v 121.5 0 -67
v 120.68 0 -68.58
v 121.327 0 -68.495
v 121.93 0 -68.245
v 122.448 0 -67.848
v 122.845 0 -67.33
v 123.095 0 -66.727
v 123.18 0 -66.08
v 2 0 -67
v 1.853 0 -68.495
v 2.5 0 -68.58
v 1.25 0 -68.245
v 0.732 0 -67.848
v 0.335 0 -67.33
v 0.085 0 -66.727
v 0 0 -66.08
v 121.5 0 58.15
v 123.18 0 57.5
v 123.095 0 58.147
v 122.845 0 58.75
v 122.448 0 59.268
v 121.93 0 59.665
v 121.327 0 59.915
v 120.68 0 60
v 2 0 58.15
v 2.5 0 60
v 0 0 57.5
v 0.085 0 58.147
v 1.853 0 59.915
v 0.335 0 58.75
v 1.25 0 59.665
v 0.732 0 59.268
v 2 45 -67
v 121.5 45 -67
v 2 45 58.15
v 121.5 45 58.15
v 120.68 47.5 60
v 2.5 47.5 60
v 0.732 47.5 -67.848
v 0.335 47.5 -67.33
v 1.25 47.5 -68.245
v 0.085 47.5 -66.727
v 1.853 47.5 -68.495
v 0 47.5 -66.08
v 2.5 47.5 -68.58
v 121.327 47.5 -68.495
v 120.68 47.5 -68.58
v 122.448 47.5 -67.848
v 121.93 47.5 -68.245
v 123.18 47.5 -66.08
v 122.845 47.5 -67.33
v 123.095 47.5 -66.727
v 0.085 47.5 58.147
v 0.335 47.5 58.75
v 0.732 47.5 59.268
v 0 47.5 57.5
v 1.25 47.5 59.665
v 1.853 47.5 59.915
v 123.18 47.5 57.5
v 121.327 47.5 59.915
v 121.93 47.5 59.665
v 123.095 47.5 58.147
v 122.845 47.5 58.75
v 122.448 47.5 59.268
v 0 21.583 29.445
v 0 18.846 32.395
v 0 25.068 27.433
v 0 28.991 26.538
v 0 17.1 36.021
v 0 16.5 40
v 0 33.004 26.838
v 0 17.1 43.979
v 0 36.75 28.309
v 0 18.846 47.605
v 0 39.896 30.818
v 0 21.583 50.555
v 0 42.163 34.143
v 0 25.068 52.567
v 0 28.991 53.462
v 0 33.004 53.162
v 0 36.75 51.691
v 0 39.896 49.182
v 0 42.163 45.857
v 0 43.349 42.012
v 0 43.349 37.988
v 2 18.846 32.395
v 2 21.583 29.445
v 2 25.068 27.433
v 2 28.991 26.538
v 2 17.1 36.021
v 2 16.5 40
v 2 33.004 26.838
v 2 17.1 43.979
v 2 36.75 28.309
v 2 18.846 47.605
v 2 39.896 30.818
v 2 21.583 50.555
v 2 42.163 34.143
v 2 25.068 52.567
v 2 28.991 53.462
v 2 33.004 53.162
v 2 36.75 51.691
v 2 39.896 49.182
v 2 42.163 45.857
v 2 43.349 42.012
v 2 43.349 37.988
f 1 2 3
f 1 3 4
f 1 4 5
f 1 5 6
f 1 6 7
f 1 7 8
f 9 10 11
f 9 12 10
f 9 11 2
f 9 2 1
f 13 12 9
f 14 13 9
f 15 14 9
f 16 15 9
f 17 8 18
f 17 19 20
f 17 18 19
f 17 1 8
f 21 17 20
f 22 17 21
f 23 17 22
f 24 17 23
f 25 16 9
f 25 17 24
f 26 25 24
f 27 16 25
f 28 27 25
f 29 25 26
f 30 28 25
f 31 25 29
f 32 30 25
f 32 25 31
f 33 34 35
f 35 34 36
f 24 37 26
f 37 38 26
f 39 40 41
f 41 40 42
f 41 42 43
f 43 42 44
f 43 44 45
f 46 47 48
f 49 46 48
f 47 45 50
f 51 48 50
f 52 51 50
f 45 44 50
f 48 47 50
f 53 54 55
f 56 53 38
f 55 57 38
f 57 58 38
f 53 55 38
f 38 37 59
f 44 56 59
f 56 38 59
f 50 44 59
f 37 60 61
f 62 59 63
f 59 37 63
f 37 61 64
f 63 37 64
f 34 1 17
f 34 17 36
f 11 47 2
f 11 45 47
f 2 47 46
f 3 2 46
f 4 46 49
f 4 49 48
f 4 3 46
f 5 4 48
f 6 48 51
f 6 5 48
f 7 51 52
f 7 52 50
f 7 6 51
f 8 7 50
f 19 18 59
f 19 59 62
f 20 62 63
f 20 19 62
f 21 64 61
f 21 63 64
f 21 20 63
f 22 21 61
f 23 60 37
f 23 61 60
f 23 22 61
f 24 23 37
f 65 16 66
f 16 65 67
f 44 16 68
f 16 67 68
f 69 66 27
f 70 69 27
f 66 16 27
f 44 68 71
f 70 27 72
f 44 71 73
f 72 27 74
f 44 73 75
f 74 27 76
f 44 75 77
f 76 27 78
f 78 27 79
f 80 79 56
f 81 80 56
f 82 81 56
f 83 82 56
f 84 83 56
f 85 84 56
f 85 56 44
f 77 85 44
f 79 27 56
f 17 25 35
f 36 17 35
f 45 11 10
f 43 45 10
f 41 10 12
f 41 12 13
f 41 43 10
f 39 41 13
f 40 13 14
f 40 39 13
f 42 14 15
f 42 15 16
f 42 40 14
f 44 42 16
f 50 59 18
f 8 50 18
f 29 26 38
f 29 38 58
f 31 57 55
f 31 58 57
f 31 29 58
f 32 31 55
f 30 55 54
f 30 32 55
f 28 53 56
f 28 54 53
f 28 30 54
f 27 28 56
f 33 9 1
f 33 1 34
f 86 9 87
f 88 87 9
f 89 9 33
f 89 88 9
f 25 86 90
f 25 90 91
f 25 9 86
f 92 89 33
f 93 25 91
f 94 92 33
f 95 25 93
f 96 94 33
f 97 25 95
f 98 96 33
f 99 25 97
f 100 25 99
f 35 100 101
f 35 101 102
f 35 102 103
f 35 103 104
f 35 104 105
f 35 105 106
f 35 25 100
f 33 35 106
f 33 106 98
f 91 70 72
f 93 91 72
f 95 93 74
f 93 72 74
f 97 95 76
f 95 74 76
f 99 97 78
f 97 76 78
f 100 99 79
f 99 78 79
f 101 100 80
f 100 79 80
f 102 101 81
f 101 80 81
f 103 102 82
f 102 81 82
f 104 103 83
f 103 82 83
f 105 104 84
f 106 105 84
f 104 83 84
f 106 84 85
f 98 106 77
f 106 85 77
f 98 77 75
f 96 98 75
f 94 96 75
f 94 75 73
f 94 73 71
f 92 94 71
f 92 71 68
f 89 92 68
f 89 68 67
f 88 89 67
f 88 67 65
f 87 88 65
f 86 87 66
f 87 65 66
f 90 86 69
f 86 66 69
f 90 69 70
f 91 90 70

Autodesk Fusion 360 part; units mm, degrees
sketch "Sketch1" plane through (0, 0, 0) normal (0, 1, 0) x (1, 0, 0) in component "Box"
  line L0 (0, 0) -> (80, 0)
  line L1 (80, 0) -> (80, -60)
  line L2 (80, -60) -> (0, -60)
  line L3 (0, -60) -> (0, 0)
  dimension "d1" = 60
  dimension "d2" = 80
extrude "Extrude1" add sketch "Sketch1" along normal blind 47.5 in component "Box"
sketch "Sketch2" plane through (0, 0, 0) normal (0, 1, 0) x (1, 0, 0) in component "Box"
  line L0 (75, -5) -> (5, -5)
  line L1 (5, -5) -> (5, -55)
  line L2 (5, -55) -> (75, -55)
  line L3 (75, -55) -> (75, -5)
  line L4 (75, -5) -> (5, -55) construction
  line L5 (5, -5) -> (75, -55) construction
  line L6 (0, 0) -> (0, -60)
  point P0 (40, -30)
  point P1 (80, 0)
  point P2 (80, -60)
  dimension "d5" = 70
  dimension "d6" = 50
  dimension "d7" = 60
  dimension "d8" = 60
extrude "Extrude2" cut sketch "Sketch2" along normal blind 45 in component "Box"
fillet "Fillet1" radius 2.5 2 edges at (0, 23.75, 60) (0, 23.75, 0) in component "Box"
fillet "Fillet2" radius 2.5 2 edges at (80, 23.75, 60) (80, 23.75, 0) in component "Box"
sketch "Sketch3" plane through (0, 0, 0) normal (-1, 0, 0) x (0, -1, 0) in component "Box"
  line L0 (-47.5, 2.5) -> (0, 2.5)
  line L1 (0, 2.5) -> (0, 57.5)
  line L2 (0, 57.5) -> (-47.5, 57.5)
  line L3 (-47.5, 57.5) -> (-47.5, 2.5)
  circle A0 centre (-30, 40) radius 13.335
  dimension "d13" = 26.67
extrude "Extrude3" cut sketch "Sketch3" against normal blind 30 contours A0 in component "Box"
delete_face "DeleteFace1" 1 faces at (1.6667, 16.7313, 38.6723) in component "Box"
sketch "Sketch1 (2)" plane through (0, 0, 0) normal (-1, 0, 0) x (0, -1, 0)
  line L0 (-47.5, 2.5) -> (0, 2.5)
  line L1 (0, 2.5) -> (0, 57.5)
  line L2 (0, 57.5) -> (-47.5, 57.5)
  line L3 (-47.5, 57.5) -> (-47.5, 2.5)
  circle A0 centre (-30, 40) radius 13.5
  dimension "d16" = 27
extrude "Extrude4" cut sketch "Sketch1 (2)" against normal blind 50 contours A0 in component "Box"
delete_face "DeleteFace2" 1 faces at (78.4292, 15.8333, 0.1791) in component "Box"
delete_face "DeleteFace3" 1 faces at (77.9731, 15.8333, 59.9548) in component "Box"
extrude "Extrude5" add 1 faces at (80, 15.8333, 20) along direction (1, 0, 0) blind 43.18 in component "Box"
extrude "Extrude6" cut 1 faces at (75, 15, 38.3333) along direction (1, 0, 0) blind 45 in component "Box"
delete_face "DeleteFace4" 1 faces at (0.0028, 15.8333, 2.381) in component "Box"
delete_face "DeleteFace5" 1 faces at (2.381, 15.8333, 59.9972) in component "Box"
extrude "Extrude7" add 1 faces at (41.06, 31.6667, 0) along direction (0, 0, -1) blind 68.58 in component "Box"
extrude "Extrude8" cut 1 faces at (43.3333, 15, 5) along direction (0, 0, -1) blind 70 in component "Box"
extrude "Extrude9" cut 1 faces at (5, 24.6637, -34.4874) along direction (-1, 0, 0) blind 2 in component "Box"
extrude "Extrude10" cut 1 faces at (81, 30, 55) along direction (0, 0, 1) blind 2 in component "Box"
fillet "Fillet3" radius 2.5 1 edges at (123.18, 23.75, -68.58) in component "Box"
fillet "Fillet4" radius 2.5 1 edges at (0, 23.75, -68.58) in component "Box"
fillet "Fillet5" radius 2.5 1 edges at (0, 23.75, 60) in component "Box"
fillet "Fillet6" radius 2.5 1 edges at (123.18, 23.75, 60) in component "Box"
extrude "Extrude11" cut 1 faces at (42, 15, -65) along direction (0, 0, -1) blind 2 in component "Box"
extrude "Extrude12" cut 1 faces at (81, 30, 57) along direction (0, 0, 1) blind 0.15 in component "Box"
extrude "Extrude13" cut 1 faces at (81, 30, 57.15) along direction (0, 0, 1) blind 0.5 in component "Box"
extrude "Extrude14" cut 1 faces at (81, 30, 57.65) along direction (0, 0, 1) blind 0.5 in component "Box"
extrude "Extrude15" cut 1 faces at (120, 15, -25.2833) along direction (1, 0, 0) blind 0.5 in component "Box"
extrude "Extrude16" cut 1 faces at (120.5, 15, -25.2833) along direction (1, 0, 0) blind 0.5 in component "Box"
extrude "Extrude17" cut 1 faces at (121, 15, -25.2833) along direction (1, 0, 0) blind 0.3 in component "Box"
extrude "Extrude18" cut 1 faces at (121.3, 15, -25.2833) along direction (1, 0, 0) blind 0.2 in component "Box"
extrude "Extrude19" cut 1 faces at (3, 24.6637, -35.8208) along direction (-1, 0, 0) blind 2 in component "Box"
extrude "Extrude20" add 1 faces at (1, 24.6637, -35.8208) along direction (1, 0, 0) blind 0.5 in component "Box"
extrude "Extrude21" add 1 faces at (1.5, 24.6637, -35.8208) along direction (1, 0, 0) blind 0.5 in component "Box"
component "Box" placed x (1, 0, 0) y (0, 1, 0) z (0, 0, 1) at (0, 0, 0)
